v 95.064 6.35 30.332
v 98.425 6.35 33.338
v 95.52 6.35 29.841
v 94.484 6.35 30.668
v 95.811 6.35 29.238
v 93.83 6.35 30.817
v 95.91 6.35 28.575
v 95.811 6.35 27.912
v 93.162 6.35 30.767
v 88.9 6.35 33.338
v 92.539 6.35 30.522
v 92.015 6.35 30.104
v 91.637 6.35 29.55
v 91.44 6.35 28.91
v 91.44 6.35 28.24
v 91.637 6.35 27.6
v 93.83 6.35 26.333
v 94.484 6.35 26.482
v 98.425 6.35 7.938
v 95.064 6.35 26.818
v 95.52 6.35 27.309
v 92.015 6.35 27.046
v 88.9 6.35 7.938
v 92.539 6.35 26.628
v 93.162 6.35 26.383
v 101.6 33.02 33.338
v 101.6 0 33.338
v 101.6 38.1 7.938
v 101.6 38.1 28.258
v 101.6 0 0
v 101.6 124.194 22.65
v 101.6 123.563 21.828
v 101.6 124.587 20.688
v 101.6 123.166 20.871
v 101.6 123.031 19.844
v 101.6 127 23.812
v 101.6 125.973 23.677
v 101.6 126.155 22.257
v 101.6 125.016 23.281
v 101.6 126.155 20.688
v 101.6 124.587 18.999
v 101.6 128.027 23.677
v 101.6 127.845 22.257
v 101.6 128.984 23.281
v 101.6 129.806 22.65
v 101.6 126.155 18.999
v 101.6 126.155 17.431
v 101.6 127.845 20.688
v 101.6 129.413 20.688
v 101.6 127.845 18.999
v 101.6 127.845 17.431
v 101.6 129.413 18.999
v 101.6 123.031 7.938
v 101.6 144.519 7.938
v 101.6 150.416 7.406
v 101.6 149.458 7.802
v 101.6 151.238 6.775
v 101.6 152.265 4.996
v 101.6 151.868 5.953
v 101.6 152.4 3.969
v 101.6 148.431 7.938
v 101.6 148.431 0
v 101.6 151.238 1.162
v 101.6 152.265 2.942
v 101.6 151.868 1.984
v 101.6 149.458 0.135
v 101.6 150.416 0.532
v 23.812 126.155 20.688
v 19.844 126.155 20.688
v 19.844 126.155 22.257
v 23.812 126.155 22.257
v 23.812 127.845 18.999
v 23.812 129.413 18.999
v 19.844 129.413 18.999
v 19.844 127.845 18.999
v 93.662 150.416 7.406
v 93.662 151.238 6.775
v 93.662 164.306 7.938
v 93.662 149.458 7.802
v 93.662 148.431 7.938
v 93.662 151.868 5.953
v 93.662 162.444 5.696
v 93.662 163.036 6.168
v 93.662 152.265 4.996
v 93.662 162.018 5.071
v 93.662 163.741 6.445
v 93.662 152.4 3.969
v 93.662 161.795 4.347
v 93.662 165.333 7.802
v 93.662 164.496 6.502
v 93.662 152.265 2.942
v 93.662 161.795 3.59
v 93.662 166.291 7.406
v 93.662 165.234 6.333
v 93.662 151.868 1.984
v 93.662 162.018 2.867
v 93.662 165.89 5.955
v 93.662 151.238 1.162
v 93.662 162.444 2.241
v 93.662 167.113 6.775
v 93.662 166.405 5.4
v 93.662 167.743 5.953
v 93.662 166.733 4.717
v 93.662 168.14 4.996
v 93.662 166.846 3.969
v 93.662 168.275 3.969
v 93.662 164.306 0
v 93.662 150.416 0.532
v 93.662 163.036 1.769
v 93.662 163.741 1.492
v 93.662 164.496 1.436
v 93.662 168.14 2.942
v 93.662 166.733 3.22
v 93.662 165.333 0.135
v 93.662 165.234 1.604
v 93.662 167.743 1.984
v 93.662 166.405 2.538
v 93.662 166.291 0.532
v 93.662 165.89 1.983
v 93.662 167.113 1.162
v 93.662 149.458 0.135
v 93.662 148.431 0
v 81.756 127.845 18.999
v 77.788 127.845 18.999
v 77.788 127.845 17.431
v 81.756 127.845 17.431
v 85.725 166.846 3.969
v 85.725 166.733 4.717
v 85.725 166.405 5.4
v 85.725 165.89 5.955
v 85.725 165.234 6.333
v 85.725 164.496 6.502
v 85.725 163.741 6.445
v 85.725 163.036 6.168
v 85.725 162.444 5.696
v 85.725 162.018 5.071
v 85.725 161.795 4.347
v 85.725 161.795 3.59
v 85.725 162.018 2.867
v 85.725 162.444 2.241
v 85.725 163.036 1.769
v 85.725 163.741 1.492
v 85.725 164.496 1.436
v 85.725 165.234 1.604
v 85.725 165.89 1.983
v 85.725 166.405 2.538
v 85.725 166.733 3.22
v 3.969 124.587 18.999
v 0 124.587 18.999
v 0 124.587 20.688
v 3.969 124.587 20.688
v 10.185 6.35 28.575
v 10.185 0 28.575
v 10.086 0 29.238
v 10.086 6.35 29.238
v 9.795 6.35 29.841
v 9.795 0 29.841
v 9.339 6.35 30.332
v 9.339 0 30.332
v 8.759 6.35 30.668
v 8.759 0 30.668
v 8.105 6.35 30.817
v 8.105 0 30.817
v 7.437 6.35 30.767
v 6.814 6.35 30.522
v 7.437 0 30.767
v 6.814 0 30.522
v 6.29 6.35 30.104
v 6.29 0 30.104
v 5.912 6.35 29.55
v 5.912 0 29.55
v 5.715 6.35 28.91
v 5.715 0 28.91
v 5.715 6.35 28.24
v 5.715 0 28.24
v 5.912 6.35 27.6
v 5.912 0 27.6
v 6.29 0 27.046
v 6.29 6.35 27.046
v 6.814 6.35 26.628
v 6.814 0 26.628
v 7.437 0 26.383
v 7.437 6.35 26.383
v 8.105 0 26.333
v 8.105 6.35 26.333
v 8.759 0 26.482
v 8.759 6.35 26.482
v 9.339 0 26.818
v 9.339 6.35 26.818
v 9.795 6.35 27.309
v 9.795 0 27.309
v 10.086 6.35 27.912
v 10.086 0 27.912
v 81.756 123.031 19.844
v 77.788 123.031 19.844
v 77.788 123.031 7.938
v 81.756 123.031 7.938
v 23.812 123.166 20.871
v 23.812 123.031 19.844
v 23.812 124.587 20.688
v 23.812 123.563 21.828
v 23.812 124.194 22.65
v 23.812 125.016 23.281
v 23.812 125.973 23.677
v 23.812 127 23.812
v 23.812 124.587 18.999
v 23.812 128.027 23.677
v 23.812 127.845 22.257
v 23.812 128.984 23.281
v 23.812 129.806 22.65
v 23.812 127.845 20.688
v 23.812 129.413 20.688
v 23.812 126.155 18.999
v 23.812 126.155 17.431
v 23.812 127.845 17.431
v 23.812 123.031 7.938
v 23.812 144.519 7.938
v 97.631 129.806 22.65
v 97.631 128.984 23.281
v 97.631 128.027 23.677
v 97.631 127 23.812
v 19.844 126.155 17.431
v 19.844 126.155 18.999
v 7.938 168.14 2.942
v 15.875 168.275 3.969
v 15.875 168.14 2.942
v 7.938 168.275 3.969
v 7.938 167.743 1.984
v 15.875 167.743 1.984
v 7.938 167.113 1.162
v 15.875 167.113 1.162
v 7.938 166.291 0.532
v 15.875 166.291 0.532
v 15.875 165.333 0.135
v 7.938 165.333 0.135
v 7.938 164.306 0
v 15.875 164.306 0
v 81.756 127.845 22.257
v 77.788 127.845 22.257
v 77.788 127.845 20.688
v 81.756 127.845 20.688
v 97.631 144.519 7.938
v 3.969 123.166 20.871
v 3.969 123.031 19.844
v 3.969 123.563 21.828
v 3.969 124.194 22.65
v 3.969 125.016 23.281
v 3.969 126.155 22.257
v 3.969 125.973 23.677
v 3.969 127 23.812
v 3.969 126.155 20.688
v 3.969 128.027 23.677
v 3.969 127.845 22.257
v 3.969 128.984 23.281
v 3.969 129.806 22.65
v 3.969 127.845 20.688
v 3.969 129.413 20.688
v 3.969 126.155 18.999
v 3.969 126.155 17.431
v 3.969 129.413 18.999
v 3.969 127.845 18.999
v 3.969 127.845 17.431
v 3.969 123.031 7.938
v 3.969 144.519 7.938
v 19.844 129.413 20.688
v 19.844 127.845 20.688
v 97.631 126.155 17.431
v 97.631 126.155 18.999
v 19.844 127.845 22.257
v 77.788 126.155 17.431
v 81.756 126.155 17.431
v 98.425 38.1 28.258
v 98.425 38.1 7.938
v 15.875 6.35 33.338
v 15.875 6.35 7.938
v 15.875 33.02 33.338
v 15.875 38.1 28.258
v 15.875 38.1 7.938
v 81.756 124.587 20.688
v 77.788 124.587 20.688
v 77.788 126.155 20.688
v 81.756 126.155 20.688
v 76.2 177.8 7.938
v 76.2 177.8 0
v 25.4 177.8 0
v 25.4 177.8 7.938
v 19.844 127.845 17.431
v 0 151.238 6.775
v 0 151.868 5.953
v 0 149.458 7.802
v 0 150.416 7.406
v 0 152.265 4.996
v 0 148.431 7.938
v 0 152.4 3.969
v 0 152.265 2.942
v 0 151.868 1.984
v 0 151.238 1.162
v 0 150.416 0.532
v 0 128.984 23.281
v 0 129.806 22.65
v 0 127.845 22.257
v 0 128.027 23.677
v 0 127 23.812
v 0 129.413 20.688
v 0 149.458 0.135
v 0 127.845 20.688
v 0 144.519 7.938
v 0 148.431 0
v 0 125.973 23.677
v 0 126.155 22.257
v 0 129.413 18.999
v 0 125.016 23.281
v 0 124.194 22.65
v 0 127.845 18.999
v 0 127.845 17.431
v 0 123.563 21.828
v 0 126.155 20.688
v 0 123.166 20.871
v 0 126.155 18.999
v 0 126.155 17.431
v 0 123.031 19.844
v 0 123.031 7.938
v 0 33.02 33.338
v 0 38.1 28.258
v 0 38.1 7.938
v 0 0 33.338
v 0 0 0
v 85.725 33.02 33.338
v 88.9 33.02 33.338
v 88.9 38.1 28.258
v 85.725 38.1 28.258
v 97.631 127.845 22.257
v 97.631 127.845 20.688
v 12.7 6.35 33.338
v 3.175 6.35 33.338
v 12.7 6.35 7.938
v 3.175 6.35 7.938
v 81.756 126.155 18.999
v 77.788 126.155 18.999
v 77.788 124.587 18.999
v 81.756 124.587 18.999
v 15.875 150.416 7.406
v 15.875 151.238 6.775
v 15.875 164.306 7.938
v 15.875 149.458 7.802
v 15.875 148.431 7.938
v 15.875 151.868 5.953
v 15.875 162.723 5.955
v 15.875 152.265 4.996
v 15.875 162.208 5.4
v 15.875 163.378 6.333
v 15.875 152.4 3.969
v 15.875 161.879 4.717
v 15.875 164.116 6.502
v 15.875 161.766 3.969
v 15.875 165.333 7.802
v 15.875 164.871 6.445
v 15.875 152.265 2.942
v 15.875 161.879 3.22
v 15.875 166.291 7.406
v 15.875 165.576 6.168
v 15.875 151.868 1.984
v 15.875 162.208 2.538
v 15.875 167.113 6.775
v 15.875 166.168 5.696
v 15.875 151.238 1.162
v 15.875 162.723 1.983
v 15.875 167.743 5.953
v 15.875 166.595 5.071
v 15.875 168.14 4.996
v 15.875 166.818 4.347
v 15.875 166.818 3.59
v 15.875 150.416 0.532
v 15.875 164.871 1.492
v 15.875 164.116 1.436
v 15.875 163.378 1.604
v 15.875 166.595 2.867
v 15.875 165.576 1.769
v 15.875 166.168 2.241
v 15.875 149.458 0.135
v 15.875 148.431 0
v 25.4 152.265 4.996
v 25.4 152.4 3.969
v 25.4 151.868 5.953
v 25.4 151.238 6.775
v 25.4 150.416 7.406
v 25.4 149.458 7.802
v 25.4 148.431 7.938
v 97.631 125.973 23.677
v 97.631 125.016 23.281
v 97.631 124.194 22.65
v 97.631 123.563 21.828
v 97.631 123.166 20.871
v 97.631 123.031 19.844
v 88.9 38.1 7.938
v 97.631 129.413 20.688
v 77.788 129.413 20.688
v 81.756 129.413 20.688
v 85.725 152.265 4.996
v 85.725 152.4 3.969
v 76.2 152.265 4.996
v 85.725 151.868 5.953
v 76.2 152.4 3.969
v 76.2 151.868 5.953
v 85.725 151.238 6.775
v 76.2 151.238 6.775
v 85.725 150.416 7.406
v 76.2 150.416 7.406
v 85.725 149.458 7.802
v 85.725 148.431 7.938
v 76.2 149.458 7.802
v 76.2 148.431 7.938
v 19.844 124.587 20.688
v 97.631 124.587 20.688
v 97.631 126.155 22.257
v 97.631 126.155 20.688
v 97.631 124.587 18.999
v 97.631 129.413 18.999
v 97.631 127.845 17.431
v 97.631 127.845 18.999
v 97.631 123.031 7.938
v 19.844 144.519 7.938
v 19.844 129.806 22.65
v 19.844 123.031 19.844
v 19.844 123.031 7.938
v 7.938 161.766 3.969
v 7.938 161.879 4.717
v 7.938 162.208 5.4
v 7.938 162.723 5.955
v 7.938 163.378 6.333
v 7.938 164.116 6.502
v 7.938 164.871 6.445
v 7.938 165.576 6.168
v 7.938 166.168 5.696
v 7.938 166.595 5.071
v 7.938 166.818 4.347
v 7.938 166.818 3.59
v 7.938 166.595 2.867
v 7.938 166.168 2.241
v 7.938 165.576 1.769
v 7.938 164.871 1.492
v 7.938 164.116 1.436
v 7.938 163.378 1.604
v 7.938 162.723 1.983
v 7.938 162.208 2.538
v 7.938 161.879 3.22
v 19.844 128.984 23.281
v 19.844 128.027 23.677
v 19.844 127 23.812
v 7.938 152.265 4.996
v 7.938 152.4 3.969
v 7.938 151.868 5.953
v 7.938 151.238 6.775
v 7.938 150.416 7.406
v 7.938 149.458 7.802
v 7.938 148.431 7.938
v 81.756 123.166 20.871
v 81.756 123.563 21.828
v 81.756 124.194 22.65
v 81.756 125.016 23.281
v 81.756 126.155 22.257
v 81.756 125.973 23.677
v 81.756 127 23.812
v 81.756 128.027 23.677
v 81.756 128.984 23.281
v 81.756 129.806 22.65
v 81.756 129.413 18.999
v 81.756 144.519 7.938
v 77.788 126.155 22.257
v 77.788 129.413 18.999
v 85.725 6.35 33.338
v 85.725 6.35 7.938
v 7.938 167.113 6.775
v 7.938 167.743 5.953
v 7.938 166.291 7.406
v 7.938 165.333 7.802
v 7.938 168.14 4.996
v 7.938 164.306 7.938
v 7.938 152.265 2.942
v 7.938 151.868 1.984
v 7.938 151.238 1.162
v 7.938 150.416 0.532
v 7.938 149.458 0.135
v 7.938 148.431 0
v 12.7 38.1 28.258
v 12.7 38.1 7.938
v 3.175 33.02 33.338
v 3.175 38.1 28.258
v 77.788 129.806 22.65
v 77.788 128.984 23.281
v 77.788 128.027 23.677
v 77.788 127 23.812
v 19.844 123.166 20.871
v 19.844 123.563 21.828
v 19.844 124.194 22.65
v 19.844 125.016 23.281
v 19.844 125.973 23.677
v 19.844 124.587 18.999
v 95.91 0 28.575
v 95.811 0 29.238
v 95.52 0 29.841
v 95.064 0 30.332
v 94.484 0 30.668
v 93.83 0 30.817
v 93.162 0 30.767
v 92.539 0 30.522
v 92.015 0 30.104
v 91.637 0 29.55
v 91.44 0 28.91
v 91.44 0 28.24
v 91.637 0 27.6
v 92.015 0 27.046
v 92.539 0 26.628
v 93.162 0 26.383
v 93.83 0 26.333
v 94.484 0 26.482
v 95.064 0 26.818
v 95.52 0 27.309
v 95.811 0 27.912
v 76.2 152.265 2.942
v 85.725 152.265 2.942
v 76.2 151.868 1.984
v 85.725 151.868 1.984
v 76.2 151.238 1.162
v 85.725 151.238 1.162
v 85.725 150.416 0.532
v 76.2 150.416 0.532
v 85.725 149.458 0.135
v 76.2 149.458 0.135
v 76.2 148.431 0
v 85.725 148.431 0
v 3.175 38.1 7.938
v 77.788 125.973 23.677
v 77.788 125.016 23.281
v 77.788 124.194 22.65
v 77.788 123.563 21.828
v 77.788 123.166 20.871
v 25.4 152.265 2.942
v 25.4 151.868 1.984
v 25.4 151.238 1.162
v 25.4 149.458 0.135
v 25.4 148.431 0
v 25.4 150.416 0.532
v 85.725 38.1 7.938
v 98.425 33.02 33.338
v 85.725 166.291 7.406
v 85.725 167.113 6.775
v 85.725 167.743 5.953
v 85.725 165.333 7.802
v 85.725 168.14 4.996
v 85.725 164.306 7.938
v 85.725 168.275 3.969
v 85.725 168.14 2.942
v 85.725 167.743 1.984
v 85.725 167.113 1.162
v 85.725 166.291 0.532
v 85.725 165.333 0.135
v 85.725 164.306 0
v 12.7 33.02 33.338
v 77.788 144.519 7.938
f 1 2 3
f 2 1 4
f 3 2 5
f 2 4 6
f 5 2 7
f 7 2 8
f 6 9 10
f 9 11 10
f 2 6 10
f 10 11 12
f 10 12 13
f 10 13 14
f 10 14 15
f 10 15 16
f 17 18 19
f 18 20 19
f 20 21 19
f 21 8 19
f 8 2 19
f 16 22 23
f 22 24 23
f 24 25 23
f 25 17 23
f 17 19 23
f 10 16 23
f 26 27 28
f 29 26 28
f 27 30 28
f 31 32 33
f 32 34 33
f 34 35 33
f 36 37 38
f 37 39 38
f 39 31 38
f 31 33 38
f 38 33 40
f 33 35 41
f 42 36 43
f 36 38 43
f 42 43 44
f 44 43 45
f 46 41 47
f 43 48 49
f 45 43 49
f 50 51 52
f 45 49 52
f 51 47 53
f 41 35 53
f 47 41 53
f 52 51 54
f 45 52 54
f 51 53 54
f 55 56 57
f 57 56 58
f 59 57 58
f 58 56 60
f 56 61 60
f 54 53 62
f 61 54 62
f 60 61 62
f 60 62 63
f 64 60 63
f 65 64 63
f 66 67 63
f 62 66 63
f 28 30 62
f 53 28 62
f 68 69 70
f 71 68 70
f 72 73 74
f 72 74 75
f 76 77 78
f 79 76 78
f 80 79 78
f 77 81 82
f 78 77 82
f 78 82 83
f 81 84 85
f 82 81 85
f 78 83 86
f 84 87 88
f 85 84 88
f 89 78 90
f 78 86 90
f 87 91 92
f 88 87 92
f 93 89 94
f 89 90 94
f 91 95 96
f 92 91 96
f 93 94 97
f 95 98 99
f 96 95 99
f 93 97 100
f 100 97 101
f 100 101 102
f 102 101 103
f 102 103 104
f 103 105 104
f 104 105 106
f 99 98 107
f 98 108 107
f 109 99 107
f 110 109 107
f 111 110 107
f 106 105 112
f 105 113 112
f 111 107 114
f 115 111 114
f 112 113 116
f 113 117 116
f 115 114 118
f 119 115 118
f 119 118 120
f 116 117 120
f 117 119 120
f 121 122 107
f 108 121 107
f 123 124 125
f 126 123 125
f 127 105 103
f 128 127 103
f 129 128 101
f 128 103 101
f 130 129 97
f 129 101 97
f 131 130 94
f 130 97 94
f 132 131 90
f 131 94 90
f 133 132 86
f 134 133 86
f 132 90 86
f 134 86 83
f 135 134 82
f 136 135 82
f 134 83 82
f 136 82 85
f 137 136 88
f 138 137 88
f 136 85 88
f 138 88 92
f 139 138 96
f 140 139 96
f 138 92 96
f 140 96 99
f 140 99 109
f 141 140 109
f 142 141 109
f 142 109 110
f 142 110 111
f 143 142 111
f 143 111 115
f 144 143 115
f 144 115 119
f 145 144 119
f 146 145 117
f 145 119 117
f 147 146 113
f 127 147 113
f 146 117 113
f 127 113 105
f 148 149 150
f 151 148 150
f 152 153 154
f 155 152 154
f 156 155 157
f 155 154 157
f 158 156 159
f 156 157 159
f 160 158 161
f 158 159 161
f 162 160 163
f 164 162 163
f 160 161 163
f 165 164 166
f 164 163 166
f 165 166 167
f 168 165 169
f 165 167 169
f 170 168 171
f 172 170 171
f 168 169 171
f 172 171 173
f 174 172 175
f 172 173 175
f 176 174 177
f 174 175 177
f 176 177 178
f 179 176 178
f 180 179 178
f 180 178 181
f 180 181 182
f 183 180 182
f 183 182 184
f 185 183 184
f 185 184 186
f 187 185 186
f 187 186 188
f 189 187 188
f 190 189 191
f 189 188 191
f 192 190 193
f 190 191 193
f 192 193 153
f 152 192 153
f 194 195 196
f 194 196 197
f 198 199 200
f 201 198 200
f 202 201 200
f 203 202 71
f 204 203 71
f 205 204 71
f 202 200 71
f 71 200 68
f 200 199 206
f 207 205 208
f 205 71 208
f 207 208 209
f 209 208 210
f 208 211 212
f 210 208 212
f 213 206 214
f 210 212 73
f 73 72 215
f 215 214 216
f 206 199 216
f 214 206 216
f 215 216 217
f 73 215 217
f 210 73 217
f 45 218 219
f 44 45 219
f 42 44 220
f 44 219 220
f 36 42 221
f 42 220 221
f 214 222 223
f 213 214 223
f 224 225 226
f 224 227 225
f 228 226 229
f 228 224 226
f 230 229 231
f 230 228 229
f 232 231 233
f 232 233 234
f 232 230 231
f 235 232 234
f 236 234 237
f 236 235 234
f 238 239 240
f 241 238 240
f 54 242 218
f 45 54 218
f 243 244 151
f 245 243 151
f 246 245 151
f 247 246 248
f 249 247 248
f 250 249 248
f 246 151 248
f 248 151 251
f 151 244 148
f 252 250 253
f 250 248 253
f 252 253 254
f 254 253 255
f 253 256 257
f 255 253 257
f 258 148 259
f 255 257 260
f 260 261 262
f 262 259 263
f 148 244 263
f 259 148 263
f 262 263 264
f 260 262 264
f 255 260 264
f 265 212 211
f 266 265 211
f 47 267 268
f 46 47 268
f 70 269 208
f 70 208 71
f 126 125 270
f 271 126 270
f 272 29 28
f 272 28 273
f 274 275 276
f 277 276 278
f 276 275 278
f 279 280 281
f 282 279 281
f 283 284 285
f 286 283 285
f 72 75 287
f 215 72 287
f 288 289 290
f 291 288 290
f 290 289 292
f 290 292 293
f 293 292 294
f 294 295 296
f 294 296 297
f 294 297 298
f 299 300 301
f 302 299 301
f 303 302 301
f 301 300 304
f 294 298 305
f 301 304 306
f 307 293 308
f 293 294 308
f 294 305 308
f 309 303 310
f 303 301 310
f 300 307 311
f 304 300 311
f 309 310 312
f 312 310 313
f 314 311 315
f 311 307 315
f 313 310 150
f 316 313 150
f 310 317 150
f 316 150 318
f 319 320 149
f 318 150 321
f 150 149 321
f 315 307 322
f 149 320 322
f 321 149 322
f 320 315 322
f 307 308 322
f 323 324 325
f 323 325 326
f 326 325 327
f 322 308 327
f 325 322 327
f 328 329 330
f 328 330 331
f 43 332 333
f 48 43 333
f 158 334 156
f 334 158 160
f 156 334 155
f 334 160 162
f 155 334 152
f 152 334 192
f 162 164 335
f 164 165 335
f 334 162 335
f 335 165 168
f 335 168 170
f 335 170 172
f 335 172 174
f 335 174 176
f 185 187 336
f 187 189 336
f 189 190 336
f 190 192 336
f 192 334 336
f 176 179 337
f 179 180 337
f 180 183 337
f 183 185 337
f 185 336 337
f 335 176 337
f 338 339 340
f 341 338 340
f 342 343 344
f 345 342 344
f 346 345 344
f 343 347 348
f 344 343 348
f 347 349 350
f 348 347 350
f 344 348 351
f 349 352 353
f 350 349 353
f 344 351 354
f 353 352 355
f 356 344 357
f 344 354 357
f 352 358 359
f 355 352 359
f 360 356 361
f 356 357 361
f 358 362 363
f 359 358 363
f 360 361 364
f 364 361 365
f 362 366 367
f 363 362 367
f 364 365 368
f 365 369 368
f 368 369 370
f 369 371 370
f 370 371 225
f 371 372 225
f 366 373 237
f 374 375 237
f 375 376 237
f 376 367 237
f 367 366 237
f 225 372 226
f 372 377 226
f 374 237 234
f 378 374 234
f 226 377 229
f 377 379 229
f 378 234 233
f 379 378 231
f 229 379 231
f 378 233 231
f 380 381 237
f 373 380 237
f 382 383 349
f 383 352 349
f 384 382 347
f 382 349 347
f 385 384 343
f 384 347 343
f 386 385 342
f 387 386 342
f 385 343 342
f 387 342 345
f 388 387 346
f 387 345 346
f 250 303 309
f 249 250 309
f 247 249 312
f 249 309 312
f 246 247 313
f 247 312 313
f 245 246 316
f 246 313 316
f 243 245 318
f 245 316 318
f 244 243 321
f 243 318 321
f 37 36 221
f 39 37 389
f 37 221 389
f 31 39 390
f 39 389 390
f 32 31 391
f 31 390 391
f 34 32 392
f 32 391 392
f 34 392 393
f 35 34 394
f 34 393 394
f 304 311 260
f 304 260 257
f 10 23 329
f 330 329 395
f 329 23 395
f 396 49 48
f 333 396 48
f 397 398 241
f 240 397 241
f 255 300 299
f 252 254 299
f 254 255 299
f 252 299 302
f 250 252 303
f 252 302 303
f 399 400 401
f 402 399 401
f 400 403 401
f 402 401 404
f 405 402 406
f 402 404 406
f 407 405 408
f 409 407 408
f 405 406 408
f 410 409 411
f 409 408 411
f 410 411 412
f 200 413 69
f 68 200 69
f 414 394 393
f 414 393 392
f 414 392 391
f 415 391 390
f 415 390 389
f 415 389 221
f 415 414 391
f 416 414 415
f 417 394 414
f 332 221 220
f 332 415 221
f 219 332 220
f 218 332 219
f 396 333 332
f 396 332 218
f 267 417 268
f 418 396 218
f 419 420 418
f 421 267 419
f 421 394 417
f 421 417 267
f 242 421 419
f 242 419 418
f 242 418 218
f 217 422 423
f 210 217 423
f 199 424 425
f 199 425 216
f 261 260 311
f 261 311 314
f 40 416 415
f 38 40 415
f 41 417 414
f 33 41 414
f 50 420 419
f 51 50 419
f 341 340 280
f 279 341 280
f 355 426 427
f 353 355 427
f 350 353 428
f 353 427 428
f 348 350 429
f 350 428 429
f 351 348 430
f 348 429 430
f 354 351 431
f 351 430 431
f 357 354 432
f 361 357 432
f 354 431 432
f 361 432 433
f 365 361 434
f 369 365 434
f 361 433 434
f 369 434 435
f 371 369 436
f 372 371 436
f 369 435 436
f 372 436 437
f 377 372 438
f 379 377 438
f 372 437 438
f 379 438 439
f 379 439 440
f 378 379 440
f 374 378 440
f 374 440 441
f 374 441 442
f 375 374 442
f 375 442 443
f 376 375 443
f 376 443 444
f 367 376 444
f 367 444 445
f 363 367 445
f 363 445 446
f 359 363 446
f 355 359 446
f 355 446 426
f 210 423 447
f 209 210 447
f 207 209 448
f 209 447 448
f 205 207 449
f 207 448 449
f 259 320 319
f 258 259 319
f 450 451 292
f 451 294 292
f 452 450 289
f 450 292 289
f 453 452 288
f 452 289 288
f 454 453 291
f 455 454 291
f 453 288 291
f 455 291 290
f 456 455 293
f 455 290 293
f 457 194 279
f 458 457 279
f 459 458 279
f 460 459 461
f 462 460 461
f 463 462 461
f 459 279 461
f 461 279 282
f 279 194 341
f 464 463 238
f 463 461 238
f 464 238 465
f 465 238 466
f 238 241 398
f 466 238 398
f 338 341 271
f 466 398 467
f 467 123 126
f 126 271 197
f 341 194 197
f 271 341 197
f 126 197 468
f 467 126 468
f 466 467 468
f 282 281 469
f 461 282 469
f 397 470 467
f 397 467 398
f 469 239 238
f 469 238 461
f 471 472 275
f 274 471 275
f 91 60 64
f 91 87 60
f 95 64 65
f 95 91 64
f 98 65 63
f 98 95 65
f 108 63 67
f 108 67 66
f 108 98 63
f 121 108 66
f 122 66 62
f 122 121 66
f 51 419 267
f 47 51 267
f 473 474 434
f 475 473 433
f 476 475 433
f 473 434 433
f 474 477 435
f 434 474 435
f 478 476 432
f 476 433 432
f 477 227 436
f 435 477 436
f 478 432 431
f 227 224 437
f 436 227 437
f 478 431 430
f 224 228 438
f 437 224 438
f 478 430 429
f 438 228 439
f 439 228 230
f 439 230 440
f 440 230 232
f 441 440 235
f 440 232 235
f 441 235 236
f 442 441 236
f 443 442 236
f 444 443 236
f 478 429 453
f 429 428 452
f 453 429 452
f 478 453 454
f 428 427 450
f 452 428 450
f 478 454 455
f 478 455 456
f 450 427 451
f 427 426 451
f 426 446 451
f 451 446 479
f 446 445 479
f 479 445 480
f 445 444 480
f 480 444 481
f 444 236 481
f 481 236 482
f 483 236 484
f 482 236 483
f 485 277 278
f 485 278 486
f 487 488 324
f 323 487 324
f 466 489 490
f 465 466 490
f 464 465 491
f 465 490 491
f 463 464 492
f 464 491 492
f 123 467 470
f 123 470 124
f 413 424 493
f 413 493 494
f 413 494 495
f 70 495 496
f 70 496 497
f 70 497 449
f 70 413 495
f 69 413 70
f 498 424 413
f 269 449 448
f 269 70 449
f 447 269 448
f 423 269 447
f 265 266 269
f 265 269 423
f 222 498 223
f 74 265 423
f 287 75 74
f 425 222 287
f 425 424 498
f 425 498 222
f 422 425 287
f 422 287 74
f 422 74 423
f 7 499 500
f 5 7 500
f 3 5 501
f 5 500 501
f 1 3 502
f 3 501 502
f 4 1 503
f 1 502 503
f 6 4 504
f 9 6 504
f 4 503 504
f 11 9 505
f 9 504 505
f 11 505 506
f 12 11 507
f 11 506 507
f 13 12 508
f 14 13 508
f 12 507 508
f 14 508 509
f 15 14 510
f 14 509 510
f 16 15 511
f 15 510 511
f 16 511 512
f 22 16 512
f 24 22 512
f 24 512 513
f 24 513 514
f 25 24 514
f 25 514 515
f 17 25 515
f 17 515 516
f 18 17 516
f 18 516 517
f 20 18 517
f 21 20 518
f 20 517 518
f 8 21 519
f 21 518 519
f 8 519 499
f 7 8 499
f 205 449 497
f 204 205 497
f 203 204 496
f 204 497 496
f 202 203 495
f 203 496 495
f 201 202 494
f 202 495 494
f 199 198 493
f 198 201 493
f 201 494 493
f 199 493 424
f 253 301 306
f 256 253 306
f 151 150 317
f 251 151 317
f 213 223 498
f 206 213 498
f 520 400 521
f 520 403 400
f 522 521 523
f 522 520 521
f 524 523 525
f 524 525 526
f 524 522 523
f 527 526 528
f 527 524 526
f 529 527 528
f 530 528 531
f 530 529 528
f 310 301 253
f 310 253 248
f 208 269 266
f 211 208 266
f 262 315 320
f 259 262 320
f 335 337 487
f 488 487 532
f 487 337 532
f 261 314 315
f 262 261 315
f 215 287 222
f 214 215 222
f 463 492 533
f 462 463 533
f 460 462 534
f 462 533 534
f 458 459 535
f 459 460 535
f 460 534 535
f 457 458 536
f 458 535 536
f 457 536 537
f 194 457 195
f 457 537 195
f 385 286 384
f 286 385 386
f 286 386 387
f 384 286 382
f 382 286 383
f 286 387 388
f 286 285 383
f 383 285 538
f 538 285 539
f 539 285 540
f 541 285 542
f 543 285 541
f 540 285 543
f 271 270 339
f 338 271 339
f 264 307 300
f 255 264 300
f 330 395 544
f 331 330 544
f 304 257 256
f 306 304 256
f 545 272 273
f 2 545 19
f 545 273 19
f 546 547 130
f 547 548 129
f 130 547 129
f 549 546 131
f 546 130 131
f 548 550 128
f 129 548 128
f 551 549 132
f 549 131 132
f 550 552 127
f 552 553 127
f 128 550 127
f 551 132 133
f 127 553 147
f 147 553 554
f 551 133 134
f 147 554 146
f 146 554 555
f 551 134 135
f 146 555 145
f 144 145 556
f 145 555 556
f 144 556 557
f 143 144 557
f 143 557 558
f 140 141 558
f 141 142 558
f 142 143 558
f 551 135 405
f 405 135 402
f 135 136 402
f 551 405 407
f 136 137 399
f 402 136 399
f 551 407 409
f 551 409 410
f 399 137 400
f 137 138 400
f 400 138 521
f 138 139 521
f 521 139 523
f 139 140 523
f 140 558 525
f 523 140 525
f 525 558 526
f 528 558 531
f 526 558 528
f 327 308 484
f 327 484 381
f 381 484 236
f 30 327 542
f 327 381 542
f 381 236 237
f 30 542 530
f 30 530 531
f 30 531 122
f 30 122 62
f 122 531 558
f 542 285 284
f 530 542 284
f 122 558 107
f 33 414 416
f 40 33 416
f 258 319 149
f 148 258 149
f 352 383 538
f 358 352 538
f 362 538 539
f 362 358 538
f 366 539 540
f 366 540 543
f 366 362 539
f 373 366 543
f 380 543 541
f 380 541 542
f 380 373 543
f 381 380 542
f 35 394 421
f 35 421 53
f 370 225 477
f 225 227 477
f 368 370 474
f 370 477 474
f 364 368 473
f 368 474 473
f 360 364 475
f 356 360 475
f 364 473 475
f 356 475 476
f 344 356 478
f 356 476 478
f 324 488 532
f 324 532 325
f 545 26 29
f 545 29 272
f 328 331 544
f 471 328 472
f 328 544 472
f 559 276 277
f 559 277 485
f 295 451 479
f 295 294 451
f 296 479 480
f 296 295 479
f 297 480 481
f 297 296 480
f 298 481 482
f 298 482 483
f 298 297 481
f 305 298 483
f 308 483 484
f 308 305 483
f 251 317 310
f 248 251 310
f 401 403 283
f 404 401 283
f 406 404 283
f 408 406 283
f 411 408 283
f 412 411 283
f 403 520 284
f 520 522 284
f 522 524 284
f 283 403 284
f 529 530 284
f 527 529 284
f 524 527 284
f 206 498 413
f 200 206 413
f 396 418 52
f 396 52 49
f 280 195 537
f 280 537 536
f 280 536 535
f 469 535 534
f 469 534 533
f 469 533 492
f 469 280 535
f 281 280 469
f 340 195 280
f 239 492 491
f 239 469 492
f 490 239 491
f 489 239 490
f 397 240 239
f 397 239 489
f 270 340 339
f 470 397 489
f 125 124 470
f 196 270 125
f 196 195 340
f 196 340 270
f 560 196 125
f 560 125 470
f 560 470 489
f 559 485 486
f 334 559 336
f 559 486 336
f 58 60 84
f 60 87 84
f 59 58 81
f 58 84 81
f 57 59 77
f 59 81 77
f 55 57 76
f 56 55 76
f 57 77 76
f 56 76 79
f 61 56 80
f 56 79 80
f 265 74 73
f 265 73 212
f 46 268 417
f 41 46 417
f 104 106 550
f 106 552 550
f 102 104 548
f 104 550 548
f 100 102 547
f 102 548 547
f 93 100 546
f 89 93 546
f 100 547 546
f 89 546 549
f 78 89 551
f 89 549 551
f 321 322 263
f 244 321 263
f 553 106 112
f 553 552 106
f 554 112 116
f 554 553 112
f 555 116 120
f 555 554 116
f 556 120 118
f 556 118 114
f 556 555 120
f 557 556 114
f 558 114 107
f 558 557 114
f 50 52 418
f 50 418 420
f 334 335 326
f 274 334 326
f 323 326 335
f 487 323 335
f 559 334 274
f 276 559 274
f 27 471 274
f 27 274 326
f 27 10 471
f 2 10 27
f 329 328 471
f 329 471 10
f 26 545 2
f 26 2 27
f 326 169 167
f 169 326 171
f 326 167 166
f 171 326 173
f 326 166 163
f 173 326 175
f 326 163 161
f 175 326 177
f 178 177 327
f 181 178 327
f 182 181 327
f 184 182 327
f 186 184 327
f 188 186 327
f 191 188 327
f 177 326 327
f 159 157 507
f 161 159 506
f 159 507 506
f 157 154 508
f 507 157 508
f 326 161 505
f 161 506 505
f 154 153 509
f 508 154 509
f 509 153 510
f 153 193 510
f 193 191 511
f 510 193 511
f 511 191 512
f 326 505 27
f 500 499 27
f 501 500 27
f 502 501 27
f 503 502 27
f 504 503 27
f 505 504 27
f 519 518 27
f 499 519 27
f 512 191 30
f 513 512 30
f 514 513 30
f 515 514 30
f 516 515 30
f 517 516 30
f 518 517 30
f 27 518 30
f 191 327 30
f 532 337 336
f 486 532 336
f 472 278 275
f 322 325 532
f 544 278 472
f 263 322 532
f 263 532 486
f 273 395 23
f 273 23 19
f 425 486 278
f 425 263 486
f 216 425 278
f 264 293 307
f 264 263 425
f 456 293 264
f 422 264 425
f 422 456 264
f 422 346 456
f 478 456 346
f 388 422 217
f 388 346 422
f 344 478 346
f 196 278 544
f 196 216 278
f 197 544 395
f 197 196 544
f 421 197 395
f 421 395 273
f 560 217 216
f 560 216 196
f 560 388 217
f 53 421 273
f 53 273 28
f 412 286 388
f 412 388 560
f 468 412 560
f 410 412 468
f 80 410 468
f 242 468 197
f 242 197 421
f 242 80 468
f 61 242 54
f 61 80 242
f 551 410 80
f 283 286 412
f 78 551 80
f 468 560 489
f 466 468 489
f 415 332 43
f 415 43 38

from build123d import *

# Parameters (mm, degrees)
F1_DEPTH  = 7.9375
F2_R      = 3.96874
F3_R      = 2.54
F4_DEPTH  = 25.4
F5_R      = 2.54
F6_DEPTH  = 7.9375
F7_W      = 3.96875
F7_H      = 25.4
F8_DEPTH  = 15.875
F9_W      = 1.6891
F9_H      = 1.56845
F9_H_2    = 1.6891
F9_W_2    = 1.56845
F10_DEPTH = 101.6
F12_DEPTH = 25.4
F13_SIZE  = 5.08
F14_R     = 2.2479
F15_DEPTH = 6.35


# Not quite as in the source:
# - a fillet or chamfer is up to 0.001 mm smaller than in the source, because OpenCascade refuses the exact size
# - an extrude ends at something that could not be found from the text; its depth is read off the source's solid


with BuildPart() as f1:
    # F0 (on Top) → F1 (new body)
    with BuildSketch(Plane.XY):
        Polygon((0, 152.4), (0, 0), (101.6, 0), (101.6, 152.4), (93.6625, 152.4), (93.6625, 168.275), (85.725, 168.275), (85.725, 152.4), (76.2, 152.4), (76.2, 177.8), (25.4, 177.8), (25.4, 152.4), (15.875, 152.4), (15.875, 168.275), (7.9375, 168.275), (7.9375, 152.4), align=None)
    extrude(amount=F1_DEPTH)

    # F2 (radius 3.96875 in the source; OpenCascade refuses exactly that, so slightly less here)
    f2_edges = [f1.edges().sort_by_distance(p)[0] for p in [
        (20.6375, 152.4, 0),
        (20.6375, 152.4, 7.9375),
        (11.90625, 168.275, 0),
        (11.90625, 168.275, 7.9375),
        (3.96875, 152.4, 0),
        (3.96875, 152.4, 7.9375),
        (80.9625, 152.4, 7.9375),
        (80.9625, 152.4, 0),
        (97.63125, 152.4, 0),
        (97.63125, 152.4, 7.9375),
        (89.69375, 168.275, 7.9375),
        (89.69375, 168.275, 0),
    ]]
    fillet(f2_edges, radius=F2_R)

    # F3 (on face) → F4 (cut, through all)
    with BuildSketch(Plane(origin=(0, 0, 0), x_dir=(0, -1, 0), z_dir=(-1, 0, 0))):
        with Locations((-164.30625, 3.96875)):
            Circle(F3_R)
    extrude(amount=-F4_DEPTH, mode=Mode.SUBTRACT)

    # F5 (on face) → F6 (cut, through all)
    with BuildSketch(Plane.YZ.offset(93.6625)):
        with Locations((164.30625, 3.96875)):
            Circle(F5_R)
    extrude(amount=-F6_DEPTH, mode=Mode.SUBTRACT)

    # F7 (on face) → F8 (join)
    with BuildSketch(Plane.XY.offset(7.9375)):
        with Locations((1.984375, 135.73125)):
            Rectangle(F7_W, F7_H)
        with Locations((21.828125, 135.73125)):
            Rectangle(F7_W, F7_H)
        with Locations((99.615625, 135.73125)):
            Rectangle(F7_W, F7_H)
        with Locations((79.771875, 135.73125)):
            Rectangle(F7_W, F7_H)
    extrude(amount=F8_DEPTH)

    # F9 (on face) → F10 (cut, through all)
    with BuildSketch(Plane(origin=(0, 0, 0), x_dir=(0, -1, 0), z_dir=(-1, 0, 0))):
        with BuildLine():
            Line((-123.03125, 19.84375), (-123.03125, 23.8125))
            Line((-123.03125, 23.8125), (-127, 23.8125))
            ThreePointArc((-127, 23.8125), (-124.1936699622, 22.6500800378), (-123.03125, 19.84375))
        make_face()
        with BuildLine():
            ThreePointArc((-129.8063300378, 22.6500800378), (-128.5187748722, 23.5103968947), (-127, 23.8125))
            Line((-127, 23.8125), (-148.43125, 23.8125))
            Line((-148.43125, 23.8125), (-148.43125, 7.9375))
            Line((-148.43125, 7.9375), (-144.5189100757, 7.9375))
            Line((-144.5189100757, 7.9375), (-129.8063300378, 22.6500800378))
        make_face()
        with Locations((-127, 18.214975)):
            Rectangle(F9_W, F9_H)
        with Locations((-127, 19.84375)):
            Rectangle(F9_W, F9_H_2)
        with Locations((-125.371225, 19.84375)):
            Rectangle(F9_W_2, F9_H_2)
        with Locations((-127, 21.472525)):
            Rectangle(F9_W, F9_H)
        with Locations((-128.628775, 19.84375)):
            Rectangle(F9_W_2, F9_H_2)
    extrude(amount=-F10_DEPTH, mode=Mode.SUBTRACT)

    # F11 (on face) → F12 (join)
    with BuildSketch(Plane.XY.offset(7.9375)):
        Polygon((0, 38.1), (0, 0), (101.6, 0), (101.6, 38.1), (98.425, 38.1), (98.425, 6.35), (88.9, 6.35), (88.9, 38.1), (85.725, 38.1), (85.725, 6.35), (15.875, 6.35), (15.875, 38.1), (12.7, 38.1), (12.7, 6.35), (3.175, 6.35), (3.175, 38.1), align=None)
    extrude(amount=F12_DEPTH)

    # F13
    f13_edges = [f1.edges().sort_by_distance(p)[0] for p in [
        (14.2875, 38.1, 33.3375),
        (1.5875, 38.1, 33.3375),
        (87.3125, 38.1, 33.3375),
        (100.0125, 38.1, 33.3375),
    ]]
    chamfer(f13_edges, length=F13_SIZE)

    # F14 (on face) → F15 (cut, through all)
    with BuildSketch(Plane.XZ):
        with Locations((93.6625, 28.575)):
            Circle(F14_R)
        with Locations((7.9375, 28.575)):
            Circle(F14_R)
    extrude(amount=-F15_DEPTH, mode=Mode.SUBTRACT)


solid = f1.part
